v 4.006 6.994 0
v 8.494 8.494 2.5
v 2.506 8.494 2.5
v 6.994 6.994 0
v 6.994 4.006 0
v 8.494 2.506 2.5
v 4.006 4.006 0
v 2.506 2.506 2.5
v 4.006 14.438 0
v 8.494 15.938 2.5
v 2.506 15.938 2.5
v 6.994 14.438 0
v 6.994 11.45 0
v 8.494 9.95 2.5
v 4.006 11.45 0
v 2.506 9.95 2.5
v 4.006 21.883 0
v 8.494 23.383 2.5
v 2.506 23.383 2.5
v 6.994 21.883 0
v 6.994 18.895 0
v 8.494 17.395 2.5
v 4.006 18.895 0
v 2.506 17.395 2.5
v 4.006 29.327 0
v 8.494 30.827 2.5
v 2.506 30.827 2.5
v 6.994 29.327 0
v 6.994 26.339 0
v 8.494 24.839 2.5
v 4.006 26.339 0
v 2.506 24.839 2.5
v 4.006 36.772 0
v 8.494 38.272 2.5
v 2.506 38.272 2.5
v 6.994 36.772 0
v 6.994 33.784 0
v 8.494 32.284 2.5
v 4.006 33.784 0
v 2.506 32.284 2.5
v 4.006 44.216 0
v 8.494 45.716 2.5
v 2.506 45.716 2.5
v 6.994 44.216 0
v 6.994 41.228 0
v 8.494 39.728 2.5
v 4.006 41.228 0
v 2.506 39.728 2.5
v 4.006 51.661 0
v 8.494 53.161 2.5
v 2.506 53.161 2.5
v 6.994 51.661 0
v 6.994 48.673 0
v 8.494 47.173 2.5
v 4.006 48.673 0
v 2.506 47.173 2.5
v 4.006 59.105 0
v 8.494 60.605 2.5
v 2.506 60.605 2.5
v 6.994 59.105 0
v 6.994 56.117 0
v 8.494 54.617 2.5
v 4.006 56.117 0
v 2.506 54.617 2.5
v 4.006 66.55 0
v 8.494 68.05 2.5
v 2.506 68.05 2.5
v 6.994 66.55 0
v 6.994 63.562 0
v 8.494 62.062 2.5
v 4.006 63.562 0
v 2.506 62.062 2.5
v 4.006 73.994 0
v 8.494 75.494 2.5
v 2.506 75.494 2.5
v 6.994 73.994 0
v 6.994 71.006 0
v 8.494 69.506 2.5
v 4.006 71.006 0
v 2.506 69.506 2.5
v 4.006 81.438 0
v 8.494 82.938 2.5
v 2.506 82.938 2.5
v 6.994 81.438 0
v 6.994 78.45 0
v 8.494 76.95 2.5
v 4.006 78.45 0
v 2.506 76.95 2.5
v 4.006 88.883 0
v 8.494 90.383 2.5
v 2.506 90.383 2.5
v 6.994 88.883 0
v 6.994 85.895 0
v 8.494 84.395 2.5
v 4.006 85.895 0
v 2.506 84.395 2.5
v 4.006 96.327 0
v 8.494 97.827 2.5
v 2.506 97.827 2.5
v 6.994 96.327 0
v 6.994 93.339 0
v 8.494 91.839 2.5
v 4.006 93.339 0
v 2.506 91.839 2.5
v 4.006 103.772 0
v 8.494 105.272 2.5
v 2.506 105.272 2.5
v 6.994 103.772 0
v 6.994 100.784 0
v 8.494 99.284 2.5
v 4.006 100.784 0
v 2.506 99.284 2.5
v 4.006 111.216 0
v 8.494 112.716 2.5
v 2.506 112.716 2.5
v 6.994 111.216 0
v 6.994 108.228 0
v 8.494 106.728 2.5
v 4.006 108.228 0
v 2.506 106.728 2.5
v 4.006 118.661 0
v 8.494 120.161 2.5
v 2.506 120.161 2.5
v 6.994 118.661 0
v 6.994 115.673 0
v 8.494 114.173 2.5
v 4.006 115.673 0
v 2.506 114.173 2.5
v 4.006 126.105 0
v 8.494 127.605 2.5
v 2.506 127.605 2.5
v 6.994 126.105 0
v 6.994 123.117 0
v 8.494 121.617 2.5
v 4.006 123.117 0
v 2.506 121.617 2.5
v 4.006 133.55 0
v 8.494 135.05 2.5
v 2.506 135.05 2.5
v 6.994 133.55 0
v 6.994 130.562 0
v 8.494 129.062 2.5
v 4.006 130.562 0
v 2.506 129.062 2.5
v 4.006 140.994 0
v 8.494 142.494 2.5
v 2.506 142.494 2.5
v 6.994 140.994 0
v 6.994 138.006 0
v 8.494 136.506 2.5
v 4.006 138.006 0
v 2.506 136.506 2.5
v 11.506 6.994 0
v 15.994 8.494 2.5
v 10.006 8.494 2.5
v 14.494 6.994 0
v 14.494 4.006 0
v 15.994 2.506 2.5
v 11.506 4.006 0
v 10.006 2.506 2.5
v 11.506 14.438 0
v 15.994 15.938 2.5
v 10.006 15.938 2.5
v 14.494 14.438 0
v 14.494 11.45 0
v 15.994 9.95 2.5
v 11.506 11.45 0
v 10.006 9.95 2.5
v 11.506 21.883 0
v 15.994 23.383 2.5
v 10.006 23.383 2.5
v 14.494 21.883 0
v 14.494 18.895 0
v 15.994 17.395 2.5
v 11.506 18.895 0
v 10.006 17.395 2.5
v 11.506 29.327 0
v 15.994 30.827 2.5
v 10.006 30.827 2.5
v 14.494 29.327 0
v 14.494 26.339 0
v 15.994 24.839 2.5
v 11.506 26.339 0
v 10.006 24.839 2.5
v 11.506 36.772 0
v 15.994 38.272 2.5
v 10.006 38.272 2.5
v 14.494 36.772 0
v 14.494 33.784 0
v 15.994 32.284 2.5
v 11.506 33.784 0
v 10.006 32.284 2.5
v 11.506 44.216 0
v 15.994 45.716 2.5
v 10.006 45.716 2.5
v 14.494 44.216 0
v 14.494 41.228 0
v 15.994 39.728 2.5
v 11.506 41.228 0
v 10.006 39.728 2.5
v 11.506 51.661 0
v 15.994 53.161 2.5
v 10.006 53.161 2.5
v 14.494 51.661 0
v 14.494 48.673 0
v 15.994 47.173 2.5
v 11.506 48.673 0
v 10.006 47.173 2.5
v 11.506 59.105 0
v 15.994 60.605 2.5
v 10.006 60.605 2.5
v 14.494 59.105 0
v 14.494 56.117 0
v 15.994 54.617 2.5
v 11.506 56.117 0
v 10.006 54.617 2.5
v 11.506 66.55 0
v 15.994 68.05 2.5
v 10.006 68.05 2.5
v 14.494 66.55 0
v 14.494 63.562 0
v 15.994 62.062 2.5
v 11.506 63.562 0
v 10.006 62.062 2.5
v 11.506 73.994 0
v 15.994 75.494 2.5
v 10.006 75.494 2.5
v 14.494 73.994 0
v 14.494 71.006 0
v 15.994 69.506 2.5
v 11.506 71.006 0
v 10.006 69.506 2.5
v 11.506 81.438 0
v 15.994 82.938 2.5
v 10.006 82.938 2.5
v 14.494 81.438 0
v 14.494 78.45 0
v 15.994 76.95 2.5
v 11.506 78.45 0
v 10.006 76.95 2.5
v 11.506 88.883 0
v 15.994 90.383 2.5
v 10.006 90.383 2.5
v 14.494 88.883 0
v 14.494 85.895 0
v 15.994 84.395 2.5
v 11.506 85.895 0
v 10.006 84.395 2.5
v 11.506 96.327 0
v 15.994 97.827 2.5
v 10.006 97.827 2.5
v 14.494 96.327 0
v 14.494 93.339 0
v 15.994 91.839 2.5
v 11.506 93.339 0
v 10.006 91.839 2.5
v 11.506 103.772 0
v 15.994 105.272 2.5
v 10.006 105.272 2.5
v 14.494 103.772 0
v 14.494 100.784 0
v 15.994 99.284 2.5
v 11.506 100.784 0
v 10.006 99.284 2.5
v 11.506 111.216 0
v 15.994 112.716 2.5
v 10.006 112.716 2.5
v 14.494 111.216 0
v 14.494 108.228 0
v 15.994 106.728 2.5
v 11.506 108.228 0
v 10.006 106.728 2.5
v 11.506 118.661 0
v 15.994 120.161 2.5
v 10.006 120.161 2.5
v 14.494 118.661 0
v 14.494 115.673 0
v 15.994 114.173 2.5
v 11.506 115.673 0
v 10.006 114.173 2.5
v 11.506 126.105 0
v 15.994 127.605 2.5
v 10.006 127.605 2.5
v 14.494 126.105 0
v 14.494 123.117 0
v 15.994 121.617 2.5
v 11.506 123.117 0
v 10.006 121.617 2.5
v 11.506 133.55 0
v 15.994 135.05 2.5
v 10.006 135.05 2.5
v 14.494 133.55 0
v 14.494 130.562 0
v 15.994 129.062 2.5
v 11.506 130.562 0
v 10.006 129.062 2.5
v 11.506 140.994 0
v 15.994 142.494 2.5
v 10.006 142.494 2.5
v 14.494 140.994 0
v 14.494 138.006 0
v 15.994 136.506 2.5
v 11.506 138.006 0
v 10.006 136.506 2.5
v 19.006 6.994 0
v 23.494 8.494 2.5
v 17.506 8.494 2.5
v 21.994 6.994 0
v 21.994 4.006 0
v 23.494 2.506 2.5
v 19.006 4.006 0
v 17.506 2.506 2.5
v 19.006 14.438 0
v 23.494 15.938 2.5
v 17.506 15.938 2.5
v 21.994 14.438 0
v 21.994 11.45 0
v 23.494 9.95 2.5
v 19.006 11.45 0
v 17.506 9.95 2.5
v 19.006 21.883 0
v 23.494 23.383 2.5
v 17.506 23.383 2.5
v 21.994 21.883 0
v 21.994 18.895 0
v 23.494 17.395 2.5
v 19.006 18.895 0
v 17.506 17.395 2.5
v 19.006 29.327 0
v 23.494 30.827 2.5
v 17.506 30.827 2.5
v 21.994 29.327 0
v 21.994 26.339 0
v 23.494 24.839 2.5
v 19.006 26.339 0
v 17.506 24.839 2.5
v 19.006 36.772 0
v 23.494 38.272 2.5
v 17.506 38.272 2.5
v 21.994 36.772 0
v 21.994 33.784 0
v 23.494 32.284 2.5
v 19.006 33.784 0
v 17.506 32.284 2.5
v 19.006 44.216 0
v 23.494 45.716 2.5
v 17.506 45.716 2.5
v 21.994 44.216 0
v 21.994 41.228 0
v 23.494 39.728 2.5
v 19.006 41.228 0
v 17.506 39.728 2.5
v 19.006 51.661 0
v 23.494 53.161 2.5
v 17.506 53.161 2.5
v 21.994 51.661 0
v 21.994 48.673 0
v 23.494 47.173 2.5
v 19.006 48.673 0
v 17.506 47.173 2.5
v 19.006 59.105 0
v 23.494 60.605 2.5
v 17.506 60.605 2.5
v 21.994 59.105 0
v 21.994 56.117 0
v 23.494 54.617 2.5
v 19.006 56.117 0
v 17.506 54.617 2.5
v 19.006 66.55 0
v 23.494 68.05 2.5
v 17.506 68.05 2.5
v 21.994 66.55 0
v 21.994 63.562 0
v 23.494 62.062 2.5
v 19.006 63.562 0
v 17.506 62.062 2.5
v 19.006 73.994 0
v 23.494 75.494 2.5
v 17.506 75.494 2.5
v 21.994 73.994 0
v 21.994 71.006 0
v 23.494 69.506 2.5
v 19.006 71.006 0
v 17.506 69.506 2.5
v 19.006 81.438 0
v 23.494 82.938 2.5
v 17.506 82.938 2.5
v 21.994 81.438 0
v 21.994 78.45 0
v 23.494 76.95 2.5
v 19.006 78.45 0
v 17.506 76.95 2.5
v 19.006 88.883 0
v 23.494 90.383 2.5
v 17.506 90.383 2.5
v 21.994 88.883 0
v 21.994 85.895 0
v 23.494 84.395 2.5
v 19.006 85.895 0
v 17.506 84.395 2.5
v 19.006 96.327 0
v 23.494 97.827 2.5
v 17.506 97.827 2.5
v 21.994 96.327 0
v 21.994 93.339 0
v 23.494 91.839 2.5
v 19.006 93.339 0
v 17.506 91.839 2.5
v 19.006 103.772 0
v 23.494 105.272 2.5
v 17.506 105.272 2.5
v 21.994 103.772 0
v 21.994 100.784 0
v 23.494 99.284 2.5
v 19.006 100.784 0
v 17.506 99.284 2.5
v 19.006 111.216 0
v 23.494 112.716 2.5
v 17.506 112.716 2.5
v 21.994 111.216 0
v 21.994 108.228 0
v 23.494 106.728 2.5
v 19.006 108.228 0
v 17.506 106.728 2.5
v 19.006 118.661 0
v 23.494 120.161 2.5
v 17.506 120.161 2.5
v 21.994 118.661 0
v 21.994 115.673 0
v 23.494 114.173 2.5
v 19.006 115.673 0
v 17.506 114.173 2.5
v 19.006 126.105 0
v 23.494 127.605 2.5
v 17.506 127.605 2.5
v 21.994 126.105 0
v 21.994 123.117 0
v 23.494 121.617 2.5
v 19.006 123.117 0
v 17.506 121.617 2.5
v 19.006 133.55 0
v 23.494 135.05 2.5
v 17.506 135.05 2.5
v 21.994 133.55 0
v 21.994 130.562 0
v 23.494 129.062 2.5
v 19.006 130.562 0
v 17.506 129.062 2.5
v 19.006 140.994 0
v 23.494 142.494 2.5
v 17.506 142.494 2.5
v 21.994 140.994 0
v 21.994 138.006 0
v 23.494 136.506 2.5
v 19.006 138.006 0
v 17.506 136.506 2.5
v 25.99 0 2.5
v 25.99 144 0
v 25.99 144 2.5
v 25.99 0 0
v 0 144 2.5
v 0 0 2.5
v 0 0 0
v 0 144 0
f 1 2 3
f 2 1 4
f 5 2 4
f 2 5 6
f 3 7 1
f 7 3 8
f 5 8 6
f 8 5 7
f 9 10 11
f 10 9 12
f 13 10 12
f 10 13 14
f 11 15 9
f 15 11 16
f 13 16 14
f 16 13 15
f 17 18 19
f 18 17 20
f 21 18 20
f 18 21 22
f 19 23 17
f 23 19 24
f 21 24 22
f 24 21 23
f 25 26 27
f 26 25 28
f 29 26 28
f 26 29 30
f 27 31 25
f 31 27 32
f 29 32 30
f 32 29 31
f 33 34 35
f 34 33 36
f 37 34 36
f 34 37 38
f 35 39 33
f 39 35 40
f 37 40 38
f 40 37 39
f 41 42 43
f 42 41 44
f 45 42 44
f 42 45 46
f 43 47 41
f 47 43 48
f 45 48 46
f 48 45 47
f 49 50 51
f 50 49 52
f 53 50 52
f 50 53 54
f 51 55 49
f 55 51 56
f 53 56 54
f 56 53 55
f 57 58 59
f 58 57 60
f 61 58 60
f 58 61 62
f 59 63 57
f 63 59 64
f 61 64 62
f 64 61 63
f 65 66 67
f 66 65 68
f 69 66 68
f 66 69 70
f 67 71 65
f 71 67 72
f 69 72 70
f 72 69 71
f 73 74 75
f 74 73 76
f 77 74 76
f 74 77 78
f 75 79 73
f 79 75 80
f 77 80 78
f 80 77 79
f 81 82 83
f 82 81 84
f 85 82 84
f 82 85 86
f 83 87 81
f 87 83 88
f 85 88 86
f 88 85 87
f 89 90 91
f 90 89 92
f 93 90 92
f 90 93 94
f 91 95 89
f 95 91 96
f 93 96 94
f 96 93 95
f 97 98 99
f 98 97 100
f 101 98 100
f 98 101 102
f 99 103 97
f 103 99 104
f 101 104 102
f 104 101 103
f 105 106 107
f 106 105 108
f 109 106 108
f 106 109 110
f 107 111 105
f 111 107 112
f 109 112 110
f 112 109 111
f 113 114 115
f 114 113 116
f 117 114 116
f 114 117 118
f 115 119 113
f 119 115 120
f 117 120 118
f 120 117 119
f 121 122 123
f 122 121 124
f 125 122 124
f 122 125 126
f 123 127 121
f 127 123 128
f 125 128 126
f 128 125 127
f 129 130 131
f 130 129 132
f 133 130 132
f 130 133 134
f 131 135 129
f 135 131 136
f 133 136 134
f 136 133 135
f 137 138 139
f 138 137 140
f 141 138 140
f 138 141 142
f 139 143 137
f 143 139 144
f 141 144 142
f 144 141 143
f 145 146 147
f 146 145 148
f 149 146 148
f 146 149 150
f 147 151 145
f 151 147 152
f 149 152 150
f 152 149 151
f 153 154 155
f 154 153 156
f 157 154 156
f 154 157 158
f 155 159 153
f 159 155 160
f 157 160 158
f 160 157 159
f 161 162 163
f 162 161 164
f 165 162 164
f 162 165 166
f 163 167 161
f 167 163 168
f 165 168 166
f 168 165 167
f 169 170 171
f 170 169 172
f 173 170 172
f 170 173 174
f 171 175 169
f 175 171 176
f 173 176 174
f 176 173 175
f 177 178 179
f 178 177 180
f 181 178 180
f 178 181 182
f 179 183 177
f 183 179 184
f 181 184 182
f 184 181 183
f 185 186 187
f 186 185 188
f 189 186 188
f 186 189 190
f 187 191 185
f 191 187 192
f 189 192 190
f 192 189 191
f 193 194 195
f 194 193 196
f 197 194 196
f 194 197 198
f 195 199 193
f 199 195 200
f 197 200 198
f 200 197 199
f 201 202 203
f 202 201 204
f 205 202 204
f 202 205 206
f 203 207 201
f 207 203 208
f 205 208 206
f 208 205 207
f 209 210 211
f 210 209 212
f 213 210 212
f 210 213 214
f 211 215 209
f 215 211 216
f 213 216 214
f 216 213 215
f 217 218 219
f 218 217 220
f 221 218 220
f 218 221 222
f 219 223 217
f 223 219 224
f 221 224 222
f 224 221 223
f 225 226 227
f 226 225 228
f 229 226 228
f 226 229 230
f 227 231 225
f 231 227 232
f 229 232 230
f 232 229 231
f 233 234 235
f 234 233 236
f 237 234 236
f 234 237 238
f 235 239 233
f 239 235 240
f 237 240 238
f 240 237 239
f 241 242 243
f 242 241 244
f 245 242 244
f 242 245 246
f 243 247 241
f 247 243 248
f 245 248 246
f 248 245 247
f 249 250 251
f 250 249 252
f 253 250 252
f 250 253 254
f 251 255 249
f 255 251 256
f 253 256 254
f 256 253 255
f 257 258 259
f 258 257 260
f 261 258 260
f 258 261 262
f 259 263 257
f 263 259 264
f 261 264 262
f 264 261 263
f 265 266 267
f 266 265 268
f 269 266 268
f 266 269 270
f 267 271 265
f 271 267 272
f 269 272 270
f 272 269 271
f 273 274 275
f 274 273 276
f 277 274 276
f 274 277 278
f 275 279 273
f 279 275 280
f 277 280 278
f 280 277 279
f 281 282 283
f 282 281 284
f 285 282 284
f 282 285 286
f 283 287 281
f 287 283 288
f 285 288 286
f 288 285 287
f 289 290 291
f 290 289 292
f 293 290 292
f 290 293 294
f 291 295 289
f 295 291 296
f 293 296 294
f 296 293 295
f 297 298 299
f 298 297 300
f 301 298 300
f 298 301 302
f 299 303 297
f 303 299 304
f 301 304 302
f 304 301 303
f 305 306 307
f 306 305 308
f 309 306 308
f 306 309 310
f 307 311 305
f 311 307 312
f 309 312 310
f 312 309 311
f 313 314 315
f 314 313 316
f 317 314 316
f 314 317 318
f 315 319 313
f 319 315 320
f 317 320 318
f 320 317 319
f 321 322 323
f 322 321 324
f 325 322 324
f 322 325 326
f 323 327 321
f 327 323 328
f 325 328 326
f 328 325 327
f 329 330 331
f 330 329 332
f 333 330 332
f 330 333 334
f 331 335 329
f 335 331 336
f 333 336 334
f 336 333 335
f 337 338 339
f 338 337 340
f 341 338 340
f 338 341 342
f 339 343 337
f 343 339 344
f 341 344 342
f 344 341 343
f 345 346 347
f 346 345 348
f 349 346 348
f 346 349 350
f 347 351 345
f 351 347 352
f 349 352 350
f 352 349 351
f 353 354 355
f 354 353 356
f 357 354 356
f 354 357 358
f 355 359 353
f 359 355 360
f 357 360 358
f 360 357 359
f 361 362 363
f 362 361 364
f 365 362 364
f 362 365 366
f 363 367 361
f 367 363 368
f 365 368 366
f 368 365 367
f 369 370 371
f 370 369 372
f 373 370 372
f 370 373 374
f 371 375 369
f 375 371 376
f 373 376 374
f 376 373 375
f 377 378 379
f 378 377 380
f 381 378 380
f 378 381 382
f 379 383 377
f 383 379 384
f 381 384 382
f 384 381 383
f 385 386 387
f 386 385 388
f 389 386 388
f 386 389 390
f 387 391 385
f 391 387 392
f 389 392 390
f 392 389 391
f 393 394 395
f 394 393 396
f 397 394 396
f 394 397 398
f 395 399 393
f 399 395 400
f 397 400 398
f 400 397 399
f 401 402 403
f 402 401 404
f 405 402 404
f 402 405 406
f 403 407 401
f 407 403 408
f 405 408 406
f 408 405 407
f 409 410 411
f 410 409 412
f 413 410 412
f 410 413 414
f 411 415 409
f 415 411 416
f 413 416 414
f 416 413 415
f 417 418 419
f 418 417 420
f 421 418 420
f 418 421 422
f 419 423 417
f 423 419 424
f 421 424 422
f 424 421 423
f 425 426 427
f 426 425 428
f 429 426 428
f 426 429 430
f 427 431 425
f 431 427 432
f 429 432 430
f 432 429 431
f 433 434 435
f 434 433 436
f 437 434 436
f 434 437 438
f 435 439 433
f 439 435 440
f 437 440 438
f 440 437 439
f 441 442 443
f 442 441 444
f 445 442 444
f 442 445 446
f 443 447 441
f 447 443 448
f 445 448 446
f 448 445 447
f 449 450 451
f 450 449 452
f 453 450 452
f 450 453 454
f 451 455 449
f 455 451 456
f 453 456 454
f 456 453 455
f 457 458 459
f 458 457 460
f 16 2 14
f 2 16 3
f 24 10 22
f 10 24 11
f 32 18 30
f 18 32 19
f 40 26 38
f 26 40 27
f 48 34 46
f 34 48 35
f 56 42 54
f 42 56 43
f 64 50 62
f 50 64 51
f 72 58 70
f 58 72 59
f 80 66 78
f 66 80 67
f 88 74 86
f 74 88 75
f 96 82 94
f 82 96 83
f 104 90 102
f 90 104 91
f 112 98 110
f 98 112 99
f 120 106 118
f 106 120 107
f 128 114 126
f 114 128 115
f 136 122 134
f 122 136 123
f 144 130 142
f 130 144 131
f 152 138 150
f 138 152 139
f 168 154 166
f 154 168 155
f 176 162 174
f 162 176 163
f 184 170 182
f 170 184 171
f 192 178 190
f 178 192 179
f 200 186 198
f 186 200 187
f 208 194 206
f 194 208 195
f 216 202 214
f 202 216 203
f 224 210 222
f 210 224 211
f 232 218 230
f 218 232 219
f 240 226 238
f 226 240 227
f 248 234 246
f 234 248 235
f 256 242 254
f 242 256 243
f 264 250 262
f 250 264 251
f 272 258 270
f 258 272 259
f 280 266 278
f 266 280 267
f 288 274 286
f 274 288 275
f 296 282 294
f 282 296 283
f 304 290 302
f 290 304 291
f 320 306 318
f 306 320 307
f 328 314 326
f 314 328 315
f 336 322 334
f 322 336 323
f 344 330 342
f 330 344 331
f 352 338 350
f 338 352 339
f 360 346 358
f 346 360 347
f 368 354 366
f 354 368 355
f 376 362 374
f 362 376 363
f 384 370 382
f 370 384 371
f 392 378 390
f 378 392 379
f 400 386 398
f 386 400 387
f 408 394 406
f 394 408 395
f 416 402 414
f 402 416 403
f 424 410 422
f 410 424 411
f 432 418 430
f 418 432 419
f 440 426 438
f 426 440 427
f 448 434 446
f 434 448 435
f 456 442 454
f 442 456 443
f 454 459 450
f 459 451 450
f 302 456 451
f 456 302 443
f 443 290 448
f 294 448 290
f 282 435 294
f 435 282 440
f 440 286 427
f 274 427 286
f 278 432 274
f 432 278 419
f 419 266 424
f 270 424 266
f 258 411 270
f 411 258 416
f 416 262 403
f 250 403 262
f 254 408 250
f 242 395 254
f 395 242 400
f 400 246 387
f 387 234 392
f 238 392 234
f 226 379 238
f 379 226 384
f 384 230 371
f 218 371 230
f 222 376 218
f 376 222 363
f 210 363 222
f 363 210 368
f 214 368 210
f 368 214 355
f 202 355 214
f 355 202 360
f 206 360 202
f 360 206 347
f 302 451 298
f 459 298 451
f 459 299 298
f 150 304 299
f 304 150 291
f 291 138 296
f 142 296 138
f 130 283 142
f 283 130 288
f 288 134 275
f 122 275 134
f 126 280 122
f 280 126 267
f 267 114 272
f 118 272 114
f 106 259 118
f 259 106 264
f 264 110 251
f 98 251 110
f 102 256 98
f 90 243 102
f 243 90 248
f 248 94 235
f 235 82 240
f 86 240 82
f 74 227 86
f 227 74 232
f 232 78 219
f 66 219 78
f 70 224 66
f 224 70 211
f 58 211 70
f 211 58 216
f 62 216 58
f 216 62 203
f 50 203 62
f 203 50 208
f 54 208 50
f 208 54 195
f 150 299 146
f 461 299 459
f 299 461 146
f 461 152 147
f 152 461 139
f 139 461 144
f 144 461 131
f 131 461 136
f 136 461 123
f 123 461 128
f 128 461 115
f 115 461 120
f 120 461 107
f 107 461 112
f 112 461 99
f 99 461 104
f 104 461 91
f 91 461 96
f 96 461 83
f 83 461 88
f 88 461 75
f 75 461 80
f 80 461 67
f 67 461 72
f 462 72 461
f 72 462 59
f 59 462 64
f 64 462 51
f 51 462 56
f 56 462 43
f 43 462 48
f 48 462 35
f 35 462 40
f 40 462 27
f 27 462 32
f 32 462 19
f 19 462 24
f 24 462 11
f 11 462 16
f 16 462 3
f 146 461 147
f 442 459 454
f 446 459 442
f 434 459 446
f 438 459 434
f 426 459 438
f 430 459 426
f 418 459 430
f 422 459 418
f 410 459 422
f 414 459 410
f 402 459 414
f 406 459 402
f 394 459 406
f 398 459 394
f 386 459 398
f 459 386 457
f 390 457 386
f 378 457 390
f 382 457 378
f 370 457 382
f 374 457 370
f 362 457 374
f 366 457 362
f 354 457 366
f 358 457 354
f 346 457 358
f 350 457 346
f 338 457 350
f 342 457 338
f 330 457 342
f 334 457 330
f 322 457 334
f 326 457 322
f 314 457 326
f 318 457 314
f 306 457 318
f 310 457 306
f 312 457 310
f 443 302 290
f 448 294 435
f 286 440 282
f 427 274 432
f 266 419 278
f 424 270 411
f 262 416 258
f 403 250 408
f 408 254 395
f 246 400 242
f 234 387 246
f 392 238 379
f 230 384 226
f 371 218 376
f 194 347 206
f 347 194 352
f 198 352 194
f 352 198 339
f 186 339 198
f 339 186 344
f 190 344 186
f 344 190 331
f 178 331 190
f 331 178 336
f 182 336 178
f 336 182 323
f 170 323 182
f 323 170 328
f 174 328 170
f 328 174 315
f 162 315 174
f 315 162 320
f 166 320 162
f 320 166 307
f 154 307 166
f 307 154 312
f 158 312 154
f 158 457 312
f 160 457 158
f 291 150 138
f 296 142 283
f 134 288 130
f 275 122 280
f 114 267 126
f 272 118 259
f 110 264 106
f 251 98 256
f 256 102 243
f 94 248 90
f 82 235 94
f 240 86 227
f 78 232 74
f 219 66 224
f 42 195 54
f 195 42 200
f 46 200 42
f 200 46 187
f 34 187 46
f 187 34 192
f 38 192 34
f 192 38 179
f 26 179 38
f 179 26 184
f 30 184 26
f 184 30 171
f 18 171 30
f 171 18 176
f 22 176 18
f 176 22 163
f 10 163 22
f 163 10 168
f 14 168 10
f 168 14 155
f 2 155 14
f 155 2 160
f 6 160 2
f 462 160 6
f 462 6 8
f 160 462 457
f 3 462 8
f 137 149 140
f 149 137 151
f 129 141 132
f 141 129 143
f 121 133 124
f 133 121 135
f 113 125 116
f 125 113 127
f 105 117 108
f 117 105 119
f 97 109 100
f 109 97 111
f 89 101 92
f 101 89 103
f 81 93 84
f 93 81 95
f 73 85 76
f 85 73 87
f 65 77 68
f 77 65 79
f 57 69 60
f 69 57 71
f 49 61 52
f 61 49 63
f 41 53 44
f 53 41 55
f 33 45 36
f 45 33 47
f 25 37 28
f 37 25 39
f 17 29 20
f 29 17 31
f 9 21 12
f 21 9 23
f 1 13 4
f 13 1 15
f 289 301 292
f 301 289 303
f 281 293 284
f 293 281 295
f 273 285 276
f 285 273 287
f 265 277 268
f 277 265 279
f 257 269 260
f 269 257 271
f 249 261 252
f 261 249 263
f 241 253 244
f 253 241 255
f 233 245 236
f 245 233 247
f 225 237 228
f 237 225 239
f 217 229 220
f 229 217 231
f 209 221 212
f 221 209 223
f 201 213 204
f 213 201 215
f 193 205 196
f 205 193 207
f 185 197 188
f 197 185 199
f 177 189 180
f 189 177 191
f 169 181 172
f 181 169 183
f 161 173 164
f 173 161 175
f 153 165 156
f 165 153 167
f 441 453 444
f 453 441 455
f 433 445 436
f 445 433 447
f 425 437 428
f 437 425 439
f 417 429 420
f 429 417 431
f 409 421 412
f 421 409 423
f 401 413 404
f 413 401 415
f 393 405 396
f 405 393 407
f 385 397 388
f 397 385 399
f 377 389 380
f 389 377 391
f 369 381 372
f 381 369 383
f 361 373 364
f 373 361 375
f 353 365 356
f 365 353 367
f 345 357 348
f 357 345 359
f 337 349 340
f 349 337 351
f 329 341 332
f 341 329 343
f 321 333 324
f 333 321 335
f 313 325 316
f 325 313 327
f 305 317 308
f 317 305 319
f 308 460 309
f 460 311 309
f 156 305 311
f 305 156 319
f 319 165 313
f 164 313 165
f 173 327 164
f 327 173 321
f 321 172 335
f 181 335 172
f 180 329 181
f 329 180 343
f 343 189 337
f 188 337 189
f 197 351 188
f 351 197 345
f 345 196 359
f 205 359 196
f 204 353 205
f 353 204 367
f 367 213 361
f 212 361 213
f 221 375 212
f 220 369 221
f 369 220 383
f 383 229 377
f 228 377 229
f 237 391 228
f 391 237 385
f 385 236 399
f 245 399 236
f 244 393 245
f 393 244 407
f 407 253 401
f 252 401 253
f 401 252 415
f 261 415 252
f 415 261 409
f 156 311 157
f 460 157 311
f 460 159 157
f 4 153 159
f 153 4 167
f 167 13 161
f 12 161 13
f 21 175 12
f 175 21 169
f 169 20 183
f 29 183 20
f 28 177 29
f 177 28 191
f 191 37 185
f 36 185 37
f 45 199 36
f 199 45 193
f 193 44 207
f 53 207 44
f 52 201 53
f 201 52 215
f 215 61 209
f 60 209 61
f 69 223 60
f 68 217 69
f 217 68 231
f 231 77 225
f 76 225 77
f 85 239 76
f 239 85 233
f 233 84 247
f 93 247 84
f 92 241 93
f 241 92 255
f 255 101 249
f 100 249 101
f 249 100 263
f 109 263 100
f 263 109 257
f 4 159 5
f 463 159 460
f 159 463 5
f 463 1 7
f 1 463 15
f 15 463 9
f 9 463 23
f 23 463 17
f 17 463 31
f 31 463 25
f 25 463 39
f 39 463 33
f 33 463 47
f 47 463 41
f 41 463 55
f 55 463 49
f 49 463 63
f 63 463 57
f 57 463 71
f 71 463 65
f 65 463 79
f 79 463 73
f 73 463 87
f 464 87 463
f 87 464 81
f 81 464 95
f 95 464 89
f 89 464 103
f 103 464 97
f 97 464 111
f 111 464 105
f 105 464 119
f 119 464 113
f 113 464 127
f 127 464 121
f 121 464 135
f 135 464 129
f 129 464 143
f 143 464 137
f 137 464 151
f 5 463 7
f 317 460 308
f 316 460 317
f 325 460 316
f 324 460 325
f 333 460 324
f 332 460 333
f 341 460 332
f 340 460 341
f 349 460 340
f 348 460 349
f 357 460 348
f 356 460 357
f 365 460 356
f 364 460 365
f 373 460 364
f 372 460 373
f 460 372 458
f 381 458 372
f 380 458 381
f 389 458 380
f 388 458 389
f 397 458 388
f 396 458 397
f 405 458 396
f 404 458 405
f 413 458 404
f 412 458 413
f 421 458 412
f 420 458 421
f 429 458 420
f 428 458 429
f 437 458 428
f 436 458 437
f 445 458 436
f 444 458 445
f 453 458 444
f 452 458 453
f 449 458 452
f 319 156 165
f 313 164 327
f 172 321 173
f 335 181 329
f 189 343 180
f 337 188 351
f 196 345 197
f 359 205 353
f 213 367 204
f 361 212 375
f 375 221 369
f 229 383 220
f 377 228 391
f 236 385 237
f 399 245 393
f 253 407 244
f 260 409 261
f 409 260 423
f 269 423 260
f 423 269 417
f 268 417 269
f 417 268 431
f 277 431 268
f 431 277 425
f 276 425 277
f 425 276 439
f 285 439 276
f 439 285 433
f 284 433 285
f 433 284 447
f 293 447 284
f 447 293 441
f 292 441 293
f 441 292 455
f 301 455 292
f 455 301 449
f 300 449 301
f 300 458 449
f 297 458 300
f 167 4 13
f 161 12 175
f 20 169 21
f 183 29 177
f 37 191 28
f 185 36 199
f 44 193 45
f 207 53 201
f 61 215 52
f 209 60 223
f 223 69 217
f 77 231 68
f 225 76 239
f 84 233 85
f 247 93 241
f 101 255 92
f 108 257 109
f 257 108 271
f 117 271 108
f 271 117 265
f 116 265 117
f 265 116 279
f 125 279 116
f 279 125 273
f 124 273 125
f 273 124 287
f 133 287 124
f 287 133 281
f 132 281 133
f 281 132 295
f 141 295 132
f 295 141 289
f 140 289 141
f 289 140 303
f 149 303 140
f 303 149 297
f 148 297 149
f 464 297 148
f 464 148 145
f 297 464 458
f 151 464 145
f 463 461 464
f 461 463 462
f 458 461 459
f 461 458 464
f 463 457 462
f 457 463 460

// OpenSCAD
// A custom mesh facade for Dell Optiplex 9020
//  By Carsten Thue-Bludworth
//  February, 2022

// CONFIGURATION CONSTANTS
$fn = 1;
$fa = 0.4;
// The overlap amount to help OpenSCAD form unions & differences
_DELTA = 0.01;

// These are the dimensions of the base solid
BASE_WIDTH  = 26;
BASE_HEIGHT = 144;
BASE_THICKNESS = 2.5;
// The area around perimeter that is to be unaltered
MARGIN = 2.5;


// Creates the base solid for our facade
module base() {
    cube([BASE_WIDTH-_DELTA, BASE_HEIGHT, BASE_THICKNESS]);;
}

// This is the number of mesh cutouts we want in the x axis
MESH_N_X = 2;
MESH_N_Y = 18;
// This is the largest dimension of an individual hole
MESH_SIZE_X = 6;
MESH_SIZE_Y = 5;
// This is the spacing between holes in order to get
//  MESH_N_X holes within the allowable area
MESH_X_SPACING = (BASE_WIDTH - 2*MARGIN - MESH_SIZE_X) / MESH_N_X;
MESH_Y_SPACING = (BASE_HEIGHT - 2*MARGIN - MESH_SIZE_Y) / MESH_N_Y;

// Creates an upside down pyramid
module pyramid_mesh() {
    $fn = 4;
    translate([MESH_SIZE_X/2, MESH_SIZE_X/2, 0])
    rotate([0, 180, 0])
    rotate([0, 0, 45])
        cylinder(5, MESH_SIZE_X/sqrt(2), 0);
}

// Create a polygon
module polygon_mesh(num_sides = 6) {
    // bounding box must be MESH_SIZE_X by MESH_SIZE_Y
    $fn = num_sides;
    translate([MESH_SIZE_X/2, MESH_SIZE_X/2, 0])
    rotate([0, 0, rands(0, 360, 1)[0]])
    linear_extrude(height=10, center = true, convexity = 10, twist = 0)
        circle(d = MESH_SIZE_X);
}

// Here is our main model
difference() {
    base();
    for(i = [0 : 1 : MESH_N_X]) {
        for(j = [0 : 1 : MESH_N_Y]) {
            translate([MARGIN + i*MESH_X_SPACING, MARGIN + j*MESH_Y_SPACING, BASE_THICKNESS+_DELTA])
                //polygon_mesh(3);
                pyramid_mesh();
        }
    }
}
